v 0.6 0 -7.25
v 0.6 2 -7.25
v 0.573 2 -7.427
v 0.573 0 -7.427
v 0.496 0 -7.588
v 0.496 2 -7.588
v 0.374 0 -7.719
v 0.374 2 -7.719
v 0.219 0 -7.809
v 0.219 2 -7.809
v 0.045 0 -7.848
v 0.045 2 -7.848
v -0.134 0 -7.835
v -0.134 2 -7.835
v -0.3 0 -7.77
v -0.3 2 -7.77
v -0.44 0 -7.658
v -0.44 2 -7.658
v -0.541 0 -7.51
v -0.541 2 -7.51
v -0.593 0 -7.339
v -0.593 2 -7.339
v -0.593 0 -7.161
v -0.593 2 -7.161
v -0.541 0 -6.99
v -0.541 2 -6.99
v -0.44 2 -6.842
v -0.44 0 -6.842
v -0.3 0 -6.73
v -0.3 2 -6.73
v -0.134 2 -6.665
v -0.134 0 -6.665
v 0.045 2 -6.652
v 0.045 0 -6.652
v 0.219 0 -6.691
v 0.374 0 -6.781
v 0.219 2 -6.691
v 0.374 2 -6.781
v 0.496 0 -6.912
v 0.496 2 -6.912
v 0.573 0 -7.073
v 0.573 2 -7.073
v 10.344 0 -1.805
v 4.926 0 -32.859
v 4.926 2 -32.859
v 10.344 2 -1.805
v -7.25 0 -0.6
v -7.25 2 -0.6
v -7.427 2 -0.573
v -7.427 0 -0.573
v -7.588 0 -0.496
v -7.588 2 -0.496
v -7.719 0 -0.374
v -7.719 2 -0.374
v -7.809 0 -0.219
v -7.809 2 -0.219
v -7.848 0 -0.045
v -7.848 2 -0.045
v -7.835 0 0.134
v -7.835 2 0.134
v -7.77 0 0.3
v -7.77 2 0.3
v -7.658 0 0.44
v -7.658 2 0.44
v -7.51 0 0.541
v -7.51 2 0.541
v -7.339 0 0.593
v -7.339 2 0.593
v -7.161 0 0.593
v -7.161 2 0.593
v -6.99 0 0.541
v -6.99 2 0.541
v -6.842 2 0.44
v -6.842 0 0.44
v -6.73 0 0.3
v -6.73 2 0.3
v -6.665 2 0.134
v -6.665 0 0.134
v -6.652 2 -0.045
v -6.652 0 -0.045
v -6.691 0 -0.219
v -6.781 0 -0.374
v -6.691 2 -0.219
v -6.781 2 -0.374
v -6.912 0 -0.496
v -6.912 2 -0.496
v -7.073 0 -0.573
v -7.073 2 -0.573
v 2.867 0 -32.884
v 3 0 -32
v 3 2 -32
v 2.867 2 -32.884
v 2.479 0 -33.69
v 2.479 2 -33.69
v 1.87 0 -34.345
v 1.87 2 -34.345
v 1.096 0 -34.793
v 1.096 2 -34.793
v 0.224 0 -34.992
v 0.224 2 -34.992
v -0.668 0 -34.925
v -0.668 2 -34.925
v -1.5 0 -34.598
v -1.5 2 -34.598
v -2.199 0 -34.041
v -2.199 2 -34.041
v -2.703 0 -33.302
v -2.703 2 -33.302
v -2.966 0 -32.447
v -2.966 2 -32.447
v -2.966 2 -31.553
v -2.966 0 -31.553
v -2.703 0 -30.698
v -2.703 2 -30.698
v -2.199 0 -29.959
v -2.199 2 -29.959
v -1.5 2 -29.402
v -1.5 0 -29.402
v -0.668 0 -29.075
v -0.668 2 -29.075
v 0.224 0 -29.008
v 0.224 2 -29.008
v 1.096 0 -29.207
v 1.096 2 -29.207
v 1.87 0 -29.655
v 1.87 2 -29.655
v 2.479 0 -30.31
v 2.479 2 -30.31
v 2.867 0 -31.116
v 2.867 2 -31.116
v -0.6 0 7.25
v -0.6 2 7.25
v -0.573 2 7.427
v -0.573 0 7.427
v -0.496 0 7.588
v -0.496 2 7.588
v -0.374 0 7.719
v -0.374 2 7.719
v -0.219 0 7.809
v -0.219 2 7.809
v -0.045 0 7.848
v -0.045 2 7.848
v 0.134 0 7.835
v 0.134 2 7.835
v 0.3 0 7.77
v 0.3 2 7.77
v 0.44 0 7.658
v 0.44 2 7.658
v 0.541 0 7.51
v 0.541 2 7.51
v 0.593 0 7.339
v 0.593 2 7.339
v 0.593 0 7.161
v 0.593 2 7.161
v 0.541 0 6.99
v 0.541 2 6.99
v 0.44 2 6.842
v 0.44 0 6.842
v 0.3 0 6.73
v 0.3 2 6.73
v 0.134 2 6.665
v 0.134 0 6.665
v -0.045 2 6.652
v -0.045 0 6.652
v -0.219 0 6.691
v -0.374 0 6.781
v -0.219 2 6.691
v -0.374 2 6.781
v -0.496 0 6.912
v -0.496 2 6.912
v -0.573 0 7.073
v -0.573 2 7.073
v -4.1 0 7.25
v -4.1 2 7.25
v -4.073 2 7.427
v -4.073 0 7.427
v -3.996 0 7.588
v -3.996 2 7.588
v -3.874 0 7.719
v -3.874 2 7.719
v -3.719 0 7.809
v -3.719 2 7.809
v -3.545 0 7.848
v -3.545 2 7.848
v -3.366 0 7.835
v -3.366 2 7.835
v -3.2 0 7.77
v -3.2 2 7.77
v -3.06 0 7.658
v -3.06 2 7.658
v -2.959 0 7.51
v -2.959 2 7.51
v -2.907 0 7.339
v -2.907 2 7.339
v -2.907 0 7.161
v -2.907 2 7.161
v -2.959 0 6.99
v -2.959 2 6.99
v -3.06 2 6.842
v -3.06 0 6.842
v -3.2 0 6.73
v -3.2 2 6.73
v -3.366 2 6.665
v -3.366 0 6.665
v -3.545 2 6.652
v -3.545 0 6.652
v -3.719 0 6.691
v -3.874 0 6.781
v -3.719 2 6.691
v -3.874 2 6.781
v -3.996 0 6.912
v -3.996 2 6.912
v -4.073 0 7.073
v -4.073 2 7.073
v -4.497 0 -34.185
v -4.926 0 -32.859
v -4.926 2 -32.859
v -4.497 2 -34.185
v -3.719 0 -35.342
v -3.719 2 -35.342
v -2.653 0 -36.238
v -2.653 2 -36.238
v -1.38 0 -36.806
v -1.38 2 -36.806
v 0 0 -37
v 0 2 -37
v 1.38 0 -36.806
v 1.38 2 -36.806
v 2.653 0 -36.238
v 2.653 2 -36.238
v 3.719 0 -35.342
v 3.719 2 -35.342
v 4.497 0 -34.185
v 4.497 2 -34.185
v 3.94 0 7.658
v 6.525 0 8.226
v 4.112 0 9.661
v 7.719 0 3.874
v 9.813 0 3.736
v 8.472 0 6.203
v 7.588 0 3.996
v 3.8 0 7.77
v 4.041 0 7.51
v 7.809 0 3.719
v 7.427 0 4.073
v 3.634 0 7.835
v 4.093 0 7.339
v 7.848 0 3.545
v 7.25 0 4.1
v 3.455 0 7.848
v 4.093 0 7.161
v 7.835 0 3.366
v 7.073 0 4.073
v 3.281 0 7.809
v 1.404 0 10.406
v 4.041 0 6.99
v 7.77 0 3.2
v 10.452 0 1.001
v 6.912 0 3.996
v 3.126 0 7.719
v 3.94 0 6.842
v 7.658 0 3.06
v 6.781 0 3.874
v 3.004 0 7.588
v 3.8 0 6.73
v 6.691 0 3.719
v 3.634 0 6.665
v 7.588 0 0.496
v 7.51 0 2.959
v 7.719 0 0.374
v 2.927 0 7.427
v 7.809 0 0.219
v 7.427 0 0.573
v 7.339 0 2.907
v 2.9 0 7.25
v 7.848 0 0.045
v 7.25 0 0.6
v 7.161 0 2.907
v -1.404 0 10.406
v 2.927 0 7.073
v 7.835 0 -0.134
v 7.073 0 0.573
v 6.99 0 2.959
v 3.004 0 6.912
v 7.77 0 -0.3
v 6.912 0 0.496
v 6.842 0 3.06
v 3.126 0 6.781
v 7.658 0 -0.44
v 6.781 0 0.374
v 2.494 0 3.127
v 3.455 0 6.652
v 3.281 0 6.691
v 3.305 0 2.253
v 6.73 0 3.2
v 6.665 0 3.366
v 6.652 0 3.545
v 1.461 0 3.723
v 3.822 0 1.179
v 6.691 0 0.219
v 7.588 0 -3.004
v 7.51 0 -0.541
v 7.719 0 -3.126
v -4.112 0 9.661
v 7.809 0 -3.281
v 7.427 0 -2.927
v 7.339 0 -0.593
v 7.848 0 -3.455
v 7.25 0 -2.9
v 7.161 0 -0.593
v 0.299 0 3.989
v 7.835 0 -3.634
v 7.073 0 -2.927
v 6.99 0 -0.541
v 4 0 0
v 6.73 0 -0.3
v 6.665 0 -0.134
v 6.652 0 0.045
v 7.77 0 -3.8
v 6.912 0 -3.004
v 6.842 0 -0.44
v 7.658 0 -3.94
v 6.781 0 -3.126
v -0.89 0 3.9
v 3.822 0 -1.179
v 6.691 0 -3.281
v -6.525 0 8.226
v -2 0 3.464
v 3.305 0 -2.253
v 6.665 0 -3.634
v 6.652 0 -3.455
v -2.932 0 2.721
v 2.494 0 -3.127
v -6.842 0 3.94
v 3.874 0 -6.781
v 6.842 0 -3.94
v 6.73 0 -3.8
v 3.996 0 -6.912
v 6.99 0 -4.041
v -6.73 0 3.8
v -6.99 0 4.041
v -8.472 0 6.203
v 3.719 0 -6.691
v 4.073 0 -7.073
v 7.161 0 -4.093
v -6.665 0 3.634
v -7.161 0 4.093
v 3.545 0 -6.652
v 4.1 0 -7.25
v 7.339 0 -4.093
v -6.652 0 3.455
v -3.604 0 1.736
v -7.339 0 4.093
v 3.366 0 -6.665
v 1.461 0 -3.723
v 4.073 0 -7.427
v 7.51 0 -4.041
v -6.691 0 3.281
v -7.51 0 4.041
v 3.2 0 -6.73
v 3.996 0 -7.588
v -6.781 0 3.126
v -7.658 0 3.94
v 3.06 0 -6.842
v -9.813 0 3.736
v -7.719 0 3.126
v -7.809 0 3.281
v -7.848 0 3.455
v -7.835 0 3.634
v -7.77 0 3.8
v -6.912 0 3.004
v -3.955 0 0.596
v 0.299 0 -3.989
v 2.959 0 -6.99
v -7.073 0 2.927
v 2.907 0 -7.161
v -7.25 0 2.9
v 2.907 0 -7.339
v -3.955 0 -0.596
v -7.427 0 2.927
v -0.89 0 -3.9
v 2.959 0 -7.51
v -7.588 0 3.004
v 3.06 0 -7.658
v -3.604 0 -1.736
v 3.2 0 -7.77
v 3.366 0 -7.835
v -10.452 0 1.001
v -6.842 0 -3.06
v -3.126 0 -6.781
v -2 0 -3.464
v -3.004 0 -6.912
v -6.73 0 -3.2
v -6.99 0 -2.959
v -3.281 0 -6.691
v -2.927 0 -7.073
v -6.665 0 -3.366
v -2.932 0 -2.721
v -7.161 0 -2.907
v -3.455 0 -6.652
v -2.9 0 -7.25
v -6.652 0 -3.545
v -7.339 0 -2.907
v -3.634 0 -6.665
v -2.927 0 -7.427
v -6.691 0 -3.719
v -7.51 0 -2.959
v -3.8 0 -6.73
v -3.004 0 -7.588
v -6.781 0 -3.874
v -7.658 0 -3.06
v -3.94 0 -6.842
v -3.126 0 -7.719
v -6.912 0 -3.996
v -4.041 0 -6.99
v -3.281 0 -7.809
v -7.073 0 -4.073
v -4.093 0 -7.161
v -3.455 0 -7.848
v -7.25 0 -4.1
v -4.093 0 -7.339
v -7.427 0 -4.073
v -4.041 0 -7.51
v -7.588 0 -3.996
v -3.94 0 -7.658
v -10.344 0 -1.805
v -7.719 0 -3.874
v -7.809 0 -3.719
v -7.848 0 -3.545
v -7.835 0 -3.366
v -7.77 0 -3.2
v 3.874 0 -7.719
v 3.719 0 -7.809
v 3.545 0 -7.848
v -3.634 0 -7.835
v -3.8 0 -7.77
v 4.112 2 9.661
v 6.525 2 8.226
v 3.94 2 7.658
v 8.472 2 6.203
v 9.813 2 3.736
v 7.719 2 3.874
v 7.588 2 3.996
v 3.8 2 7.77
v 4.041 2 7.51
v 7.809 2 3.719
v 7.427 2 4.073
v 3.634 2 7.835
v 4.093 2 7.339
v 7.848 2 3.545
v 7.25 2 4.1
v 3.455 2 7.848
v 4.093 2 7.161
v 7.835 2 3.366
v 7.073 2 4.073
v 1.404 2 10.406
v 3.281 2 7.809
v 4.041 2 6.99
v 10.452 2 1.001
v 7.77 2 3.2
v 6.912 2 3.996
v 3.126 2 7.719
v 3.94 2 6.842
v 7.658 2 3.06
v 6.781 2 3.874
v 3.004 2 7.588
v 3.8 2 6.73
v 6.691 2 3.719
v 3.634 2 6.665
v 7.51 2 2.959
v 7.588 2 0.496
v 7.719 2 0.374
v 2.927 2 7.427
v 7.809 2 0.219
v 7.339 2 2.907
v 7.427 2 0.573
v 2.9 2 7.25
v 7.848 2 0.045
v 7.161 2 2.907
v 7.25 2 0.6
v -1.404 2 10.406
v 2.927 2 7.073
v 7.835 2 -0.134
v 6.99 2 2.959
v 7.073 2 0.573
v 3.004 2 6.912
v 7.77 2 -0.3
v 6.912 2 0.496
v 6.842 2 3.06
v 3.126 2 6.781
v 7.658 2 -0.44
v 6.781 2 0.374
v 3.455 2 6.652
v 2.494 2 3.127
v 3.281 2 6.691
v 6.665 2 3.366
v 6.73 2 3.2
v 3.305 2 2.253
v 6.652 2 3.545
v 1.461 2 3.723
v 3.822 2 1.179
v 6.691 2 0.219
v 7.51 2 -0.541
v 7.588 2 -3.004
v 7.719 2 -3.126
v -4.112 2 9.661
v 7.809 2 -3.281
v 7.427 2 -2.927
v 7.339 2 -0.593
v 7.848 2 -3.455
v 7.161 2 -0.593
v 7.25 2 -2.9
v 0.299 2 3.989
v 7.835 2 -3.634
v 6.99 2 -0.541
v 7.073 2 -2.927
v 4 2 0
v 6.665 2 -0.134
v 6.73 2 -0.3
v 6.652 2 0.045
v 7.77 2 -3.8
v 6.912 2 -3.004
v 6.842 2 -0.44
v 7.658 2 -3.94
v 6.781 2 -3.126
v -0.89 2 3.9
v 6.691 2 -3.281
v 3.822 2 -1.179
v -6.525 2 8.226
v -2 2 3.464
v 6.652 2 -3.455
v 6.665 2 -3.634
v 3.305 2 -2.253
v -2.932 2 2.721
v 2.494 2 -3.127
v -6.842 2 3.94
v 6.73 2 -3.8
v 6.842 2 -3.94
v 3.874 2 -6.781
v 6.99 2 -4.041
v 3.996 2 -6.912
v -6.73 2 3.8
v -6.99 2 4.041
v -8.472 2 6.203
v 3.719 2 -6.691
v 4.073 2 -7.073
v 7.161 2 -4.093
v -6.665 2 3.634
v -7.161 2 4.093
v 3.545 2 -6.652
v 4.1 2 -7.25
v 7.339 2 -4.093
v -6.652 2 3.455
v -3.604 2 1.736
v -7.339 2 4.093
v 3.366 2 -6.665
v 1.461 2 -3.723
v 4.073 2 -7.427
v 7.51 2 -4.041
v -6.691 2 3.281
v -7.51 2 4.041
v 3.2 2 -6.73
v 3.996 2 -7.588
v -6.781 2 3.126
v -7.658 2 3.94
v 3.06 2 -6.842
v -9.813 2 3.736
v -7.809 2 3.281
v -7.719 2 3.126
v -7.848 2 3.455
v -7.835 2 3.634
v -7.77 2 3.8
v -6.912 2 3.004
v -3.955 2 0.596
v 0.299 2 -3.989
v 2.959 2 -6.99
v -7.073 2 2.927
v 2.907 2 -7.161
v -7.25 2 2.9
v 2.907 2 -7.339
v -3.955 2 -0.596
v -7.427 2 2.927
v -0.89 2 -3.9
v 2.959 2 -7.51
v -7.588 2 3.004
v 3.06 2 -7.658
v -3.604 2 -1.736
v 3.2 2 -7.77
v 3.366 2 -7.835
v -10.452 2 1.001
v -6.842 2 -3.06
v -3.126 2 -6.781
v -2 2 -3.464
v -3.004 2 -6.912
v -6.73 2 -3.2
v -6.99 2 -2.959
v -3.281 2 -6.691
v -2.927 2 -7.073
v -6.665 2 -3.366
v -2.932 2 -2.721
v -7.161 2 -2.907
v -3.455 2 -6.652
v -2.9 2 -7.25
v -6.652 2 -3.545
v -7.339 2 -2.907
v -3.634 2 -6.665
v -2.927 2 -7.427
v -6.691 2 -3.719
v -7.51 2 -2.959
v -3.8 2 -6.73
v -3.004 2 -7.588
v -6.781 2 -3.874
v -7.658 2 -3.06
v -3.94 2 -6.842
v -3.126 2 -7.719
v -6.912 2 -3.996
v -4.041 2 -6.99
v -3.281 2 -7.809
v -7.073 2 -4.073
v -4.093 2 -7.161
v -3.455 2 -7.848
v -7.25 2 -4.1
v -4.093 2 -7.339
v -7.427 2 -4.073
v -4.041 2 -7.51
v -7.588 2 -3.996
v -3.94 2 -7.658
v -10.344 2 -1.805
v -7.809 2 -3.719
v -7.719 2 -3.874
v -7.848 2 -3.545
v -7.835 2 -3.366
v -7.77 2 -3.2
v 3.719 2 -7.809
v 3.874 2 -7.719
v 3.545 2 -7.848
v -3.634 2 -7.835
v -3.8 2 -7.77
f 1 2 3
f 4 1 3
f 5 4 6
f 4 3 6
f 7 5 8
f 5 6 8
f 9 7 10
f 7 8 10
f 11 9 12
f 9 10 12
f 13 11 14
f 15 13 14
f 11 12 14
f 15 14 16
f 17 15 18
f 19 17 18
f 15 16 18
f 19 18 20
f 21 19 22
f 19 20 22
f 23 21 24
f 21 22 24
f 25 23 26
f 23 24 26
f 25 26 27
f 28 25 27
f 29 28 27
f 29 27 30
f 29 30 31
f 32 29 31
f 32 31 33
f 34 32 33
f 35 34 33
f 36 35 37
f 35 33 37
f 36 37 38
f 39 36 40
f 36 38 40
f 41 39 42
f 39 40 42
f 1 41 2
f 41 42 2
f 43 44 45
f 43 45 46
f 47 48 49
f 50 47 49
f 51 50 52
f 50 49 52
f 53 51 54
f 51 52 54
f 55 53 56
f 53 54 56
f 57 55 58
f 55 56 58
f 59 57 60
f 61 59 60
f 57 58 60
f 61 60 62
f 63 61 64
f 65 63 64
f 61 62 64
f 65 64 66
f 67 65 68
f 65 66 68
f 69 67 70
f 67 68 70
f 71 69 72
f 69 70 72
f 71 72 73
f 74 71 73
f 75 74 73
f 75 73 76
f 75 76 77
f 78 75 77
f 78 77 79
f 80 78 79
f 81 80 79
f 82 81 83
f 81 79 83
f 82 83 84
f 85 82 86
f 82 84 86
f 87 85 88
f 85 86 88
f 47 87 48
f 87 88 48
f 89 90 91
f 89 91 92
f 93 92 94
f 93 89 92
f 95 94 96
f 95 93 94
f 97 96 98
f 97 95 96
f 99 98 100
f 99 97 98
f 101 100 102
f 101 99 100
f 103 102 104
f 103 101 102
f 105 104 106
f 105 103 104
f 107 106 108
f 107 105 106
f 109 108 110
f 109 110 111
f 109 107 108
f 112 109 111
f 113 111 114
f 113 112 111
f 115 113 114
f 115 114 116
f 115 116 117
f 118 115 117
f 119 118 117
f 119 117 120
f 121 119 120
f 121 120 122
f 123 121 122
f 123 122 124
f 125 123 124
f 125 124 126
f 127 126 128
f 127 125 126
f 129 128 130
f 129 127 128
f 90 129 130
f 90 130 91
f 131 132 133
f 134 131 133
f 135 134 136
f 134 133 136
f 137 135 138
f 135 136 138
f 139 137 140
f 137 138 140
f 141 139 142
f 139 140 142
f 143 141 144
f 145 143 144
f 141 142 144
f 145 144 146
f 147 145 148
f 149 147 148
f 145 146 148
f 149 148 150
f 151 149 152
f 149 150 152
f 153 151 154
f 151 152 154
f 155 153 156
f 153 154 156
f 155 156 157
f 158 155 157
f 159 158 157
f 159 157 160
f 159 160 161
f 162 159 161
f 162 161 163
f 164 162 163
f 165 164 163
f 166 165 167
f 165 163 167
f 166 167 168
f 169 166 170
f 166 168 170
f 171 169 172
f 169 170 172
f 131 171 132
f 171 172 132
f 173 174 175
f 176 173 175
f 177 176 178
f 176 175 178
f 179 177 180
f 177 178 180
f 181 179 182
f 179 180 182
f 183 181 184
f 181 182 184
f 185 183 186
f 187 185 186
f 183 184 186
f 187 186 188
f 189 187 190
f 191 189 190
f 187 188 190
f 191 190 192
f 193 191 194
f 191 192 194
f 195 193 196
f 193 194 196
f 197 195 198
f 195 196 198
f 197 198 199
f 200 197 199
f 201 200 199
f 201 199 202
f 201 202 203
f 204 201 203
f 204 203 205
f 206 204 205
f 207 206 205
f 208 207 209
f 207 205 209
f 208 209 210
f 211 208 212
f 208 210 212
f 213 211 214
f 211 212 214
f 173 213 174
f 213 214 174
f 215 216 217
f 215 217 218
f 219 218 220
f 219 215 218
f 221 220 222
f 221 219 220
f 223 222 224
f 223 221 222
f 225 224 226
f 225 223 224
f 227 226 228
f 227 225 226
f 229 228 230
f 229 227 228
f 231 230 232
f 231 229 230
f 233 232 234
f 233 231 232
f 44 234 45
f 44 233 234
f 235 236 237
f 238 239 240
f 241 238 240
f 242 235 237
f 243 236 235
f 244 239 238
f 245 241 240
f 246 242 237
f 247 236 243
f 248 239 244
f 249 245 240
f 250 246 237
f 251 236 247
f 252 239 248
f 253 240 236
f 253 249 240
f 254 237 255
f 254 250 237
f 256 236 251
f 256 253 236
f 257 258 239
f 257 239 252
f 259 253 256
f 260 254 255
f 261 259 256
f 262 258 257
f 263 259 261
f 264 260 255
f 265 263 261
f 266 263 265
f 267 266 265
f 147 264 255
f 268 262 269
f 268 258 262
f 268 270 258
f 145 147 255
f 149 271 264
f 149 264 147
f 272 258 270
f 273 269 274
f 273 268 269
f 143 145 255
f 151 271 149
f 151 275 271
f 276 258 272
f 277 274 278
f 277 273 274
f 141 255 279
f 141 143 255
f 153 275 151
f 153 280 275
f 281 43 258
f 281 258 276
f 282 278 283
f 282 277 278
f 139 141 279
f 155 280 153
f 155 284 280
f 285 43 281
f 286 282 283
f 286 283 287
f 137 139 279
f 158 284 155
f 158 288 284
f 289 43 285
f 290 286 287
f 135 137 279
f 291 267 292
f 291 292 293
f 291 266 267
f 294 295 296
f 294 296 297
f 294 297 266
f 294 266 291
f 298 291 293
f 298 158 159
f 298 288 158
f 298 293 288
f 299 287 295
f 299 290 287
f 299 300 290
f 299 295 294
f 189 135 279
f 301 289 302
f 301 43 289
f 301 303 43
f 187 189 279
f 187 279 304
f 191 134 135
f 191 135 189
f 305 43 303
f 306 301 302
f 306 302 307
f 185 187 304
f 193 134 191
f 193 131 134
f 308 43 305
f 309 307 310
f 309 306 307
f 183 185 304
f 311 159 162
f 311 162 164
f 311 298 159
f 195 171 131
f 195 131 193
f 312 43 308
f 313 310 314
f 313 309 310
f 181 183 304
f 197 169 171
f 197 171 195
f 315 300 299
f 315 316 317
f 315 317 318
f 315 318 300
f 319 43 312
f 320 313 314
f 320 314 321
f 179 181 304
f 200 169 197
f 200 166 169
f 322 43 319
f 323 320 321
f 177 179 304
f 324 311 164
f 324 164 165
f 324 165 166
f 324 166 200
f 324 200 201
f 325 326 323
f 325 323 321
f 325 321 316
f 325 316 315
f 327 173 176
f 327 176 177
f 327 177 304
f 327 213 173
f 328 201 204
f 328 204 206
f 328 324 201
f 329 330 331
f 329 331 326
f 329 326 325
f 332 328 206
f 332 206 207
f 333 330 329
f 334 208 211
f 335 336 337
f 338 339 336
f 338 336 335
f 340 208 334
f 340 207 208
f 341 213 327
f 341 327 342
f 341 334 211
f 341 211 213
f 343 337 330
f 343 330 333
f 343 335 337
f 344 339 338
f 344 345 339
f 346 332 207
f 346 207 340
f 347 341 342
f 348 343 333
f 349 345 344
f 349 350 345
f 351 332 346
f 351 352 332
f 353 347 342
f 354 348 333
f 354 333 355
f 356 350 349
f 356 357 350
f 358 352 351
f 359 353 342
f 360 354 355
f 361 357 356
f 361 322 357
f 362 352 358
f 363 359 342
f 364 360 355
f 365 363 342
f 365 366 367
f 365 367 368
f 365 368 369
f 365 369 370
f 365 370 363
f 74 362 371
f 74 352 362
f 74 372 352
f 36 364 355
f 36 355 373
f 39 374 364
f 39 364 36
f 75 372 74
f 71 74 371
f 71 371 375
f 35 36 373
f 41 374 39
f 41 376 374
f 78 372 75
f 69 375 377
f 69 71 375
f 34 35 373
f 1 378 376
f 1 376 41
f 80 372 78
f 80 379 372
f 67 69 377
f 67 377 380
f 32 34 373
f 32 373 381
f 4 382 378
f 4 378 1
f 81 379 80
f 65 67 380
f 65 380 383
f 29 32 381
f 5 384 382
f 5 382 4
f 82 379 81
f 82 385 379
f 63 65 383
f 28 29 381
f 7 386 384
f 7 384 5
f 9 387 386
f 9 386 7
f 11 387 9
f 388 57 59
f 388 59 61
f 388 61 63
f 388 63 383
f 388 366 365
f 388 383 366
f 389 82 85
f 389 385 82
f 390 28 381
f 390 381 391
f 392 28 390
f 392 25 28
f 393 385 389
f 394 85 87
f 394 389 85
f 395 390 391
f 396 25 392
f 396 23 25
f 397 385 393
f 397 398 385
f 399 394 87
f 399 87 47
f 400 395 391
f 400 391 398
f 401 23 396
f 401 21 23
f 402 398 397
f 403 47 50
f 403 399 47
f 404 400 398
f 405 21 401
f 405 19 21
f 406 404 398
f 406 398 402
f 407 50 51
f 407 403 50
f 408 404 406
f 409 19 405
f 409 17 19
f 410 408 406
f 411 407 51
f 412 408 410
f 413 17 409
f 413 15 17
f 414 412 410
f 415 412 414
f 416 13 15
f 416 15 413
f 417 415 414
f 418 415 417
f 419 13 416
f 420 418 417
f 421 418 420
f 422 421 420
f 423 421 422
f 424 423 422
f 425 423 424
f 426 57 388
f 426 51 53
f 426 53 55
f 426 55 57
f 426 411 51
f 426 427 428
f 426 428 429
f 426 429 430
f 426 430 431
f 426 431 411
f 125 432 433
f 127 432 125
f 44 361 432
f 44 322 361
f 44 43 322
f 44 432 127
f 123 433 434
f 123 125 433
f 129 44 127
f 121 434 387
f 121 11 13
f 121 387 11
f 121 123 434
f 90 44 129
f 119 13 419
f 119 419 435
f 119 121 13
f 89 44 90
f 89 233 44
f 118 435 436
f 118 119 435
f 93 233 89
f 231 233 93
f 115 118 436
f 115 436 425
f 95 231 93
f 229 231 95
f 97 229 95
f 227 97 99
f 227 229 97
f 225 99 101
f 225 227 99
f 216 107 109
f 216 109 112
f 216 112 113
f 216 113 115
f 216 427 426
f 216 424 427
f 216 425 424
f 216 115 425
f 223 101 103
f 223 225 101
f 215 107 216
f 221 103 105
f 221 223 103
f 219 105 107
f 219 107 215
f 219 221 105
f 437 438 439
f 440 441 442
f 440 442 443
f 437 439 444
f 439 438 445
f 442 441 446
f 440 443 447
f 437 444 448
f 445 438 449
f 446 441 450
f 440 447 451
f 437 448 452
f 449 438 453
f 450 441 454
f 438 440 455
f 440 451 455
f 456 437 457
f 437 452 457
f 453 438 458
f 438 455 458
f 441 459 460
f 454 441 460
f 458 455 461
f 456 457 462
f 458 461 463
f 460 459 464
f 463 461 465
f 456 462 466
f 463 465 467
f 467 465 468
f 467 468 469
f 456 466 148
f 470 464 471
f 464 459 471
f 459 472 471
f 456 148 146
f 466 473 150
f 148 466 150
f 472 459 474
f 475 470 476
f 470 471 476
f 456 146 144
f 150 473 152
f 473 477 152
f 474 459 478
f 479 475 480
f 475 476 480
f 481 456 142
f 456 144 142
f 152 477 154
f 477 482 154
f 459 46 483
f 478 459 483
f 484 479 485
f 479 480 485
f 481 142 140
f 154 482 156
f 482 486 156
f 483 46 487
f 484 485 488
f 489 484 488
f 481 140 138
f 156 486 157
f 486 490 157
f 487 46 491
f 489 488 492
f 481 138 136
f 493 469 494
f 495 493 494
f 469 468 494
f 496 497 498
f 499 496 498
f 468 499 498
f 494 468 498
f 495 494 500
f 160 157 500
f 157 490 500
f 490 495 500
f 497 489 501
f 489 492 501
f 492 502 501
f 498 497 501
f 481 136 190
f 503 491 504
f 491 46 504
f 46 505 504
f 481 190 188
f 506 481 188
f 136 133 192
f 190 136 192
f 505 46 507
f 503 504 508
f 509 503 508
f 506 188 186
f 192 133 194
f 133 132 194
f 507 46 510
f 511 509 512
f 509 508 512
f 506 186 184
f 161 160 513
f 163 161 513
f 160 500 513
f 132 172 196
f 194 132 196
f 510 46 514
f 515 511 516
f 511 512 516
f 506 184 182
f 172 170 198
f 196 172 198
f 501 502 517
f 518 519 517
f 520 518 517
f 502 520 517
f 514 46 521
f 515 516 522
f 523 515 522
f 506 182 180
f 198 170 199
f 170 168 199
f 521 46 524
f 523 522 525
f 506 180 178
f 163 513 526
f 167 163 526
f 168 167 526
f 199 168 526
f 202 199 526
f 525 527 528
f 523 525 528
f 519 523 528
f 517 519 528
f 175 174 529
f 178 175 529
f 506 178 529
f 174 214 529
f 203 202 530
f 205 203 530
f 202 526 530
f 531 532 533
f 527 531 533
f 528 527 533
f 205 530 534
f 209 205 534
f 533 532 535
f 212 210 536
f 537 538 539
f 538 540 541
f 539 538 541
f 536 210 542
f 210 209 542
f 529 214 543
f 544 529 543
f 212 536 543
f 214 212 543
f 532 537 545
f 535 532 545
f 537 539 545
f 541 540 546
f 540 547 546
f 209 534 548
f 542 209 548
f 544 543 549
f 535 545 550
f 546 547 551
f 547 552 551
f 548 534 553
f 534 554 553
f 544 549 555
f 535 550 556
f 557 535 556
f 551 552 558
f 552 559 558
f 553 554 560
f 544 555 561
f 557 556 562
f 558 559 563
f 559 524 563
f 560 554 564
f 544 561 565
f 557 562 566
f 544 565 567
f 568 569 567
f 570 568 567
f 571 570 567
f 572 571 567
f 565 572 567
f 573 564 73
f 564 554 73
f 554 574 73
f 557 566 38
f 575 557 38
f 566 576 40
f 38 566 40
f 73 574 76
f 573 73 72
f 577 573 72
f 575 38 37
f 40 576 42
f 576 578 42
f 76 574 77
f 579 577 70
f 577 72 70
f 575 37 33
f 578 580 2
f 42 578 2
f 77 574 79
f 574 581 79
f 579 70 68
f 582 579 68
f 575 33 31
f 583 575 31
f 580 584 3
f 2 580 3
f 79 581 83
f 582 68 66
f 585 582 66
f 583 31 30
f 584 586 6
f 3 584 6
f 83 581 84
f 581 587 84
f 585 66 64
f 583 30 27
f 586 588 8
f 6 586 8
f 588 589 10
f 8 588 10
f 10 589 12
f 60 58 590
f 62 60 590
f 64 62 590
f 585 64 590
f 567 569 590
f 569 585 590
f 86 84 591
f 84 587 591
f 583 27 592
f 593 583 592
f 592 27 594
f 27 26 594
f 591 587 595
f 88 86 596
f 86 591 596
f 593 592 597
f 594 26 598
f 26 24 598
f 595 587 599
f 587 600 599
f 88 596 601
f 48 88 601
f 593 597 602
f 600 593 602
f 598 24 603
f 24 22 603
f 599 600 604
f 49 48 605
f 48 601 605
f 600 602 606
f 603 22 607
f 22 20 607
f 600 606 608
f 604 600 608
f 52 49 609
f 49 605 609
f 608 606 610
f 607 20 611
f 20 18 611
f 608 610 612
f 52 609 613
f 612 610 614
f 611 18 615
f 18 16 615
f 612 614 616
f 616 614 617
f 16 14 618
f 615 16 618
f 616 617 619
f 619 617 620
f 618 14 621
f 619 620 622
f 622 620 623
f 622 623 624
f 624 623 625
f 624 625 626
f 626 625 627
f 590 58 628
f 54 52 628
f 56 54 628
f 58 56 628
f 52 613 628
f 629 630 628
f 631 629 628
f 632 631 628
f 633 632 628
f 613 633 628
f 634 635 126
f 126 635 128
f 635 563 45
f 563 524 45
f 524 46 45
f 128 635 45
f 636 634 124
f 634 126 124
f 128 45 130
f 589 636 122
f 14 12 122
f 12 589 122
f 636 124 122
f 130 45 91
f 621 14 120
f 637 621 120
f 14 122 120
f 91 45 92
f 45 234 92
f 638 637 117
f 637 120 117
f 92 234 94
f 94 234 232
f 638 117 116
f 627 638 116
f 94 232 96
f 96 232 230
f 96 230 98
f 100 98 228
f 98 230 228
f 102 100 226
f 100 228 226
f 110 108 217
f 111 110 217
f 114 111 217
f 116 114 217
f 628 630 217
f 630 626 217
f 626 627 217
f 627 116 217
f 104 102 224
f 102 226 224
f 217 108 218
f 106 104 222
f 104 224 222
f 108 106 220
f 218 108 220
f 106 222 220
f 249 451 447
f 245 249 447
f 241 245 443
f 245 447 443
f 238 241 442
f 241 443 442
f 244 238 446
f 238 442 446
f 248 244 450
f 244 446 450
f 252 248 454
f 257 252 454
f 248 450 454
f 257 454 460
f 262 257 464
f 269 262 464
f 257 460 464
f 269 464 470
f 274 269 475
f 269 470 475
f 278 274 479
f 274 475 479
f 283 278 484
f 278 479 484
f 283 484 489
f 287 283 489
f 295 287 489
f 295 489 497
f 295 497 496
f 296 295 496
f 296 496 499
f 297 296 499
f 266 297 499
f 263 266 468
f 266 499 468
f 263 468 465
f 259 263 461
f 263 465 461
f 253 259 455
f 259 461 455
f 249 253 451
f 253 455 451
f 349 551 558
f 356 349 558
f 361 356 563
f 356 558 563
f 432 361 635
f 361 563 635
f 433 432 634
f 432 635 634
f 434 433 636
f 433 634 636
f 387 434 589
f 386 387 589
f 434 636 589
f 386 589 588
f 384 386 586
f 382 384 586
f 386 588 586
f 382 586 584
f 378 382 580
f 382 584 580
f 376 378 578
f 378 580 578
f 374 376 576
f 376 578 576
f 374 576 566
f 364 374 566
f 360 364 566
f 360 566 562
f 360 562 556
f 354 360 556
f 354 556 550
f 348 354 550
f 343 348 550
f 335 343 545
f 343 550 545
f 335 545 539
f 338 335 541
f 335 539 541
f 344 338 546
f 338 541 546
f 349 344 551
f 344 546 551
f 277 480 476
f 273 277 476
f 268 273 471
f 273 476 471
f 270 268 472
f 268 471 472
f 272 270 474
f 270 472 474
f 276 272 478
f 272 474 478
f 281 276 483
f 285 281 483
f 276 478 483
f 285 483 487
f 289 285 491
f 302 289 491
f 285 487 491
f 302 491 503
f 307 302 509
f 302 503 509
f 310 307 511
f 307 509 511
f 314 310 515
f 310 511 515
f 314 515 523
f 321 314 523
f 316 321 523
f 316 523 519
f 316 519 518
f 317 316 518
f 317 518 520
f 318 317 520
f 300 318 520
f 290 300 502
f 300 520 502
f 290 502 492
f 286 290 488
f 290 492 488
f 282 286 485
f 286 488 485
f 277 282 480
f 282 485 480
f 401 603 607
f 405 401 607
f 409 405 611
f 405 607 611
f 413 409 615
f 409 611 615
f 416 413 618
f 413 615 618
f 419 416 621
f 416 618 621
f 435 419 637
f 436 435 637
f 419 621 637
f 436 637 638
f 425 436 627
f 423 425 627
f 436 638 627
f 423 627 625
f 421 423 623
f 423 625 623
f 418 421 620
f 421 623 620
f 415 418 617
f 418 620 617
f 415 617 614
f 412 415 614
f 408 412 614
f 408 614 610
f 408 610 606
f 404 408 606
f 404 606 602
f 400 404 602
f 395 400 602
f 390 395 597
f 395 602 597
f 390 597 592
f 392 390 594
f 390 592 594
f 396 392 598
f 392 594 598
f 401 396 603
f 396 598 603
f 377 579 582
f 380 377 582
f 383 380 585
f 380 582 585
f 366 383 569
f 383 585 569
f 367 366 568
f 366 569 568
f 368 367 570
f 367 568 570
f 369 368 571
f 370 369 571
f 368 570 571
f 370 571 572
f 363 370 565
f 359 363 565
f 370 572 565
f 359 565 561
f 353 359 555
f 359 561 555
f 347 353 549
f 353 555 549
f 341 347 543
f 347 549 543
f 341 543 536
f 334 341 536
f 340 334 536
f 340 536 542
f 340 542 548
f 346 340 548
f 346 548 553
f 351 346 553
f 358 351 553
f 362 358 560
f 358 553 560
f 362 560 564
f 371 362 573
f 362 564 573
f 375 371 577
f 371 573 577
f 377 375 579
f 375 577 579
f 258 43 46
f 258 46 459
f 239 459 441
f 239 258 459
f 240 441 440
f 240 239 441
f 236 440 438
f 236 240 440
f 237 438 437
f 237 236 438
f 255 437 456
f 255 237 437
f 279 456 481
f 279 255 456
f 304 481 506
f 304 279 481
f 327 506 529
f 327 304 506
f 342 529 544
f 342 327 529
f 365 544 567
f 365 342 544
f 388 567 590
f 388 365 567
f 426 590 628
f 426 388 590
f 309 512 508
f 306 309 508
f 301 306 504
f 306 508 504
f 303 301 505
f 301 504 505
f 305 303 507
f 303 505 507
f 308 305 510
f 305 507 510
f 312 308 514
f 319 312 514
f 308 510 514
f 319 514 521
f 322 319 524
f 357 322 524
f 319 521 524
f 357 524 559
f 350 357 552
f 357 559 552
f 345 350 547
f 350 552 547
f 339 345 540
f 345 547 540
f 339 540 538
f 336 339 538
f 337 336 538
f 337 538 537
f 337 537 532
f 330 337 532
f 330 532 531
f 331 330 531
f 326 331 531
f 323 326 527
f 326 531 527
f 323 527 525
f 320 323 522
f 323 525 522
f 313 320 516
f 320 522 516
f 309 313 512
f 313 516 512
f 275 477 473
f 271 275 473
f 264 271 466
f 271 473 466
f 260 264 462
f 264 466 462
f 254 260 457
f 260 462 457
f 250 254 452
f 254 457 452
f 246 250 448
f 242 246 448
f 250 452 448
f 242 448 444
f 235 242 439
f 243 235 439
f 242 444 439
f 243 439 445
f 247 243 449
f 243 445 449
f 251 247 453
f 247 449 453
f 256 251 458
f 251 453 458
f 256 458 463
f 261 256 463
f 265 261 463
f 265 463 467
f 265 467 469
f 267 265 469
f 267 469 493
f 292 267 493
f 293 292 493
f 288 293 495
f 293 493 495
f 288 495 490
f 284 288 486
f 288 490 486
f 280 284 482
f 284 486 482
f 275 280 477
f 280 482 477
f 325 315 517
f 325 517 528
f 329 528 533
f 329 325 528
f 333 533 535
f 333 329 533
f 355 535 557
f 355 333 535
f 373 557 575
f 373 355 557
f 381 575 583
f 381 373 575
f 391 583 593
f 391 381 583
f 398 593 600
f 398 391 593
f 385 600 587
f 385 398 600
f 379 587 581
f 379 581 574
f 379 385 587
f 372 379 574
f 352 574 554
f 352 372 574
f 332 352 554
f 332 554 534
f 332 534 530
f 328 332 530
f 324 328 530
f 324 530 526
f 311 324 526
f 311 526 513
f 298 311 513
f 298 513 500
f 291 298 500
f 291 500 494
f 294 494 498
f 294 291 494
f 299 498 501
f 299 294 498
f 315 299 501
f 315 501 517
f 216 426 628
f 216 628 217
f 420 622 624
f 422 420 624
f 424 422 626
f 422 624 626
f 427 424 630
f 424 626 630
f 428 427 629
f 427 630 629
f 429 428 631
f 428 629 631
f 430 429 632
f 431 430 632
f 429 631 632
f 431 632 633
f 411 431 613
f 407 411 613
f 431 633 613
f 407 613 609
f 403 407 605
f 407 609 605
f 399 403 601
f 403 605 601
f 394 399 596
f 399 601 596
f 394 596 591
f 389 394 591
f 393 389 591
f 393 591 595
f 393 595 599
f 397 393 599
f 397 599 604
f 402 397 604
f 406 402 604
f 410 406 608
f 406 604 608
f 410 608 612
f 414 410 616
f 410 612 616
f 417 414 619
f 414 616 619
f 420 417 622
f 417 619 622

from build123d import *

# Parameters (mm, degrees)
CROQUIS1_R              = 4
CROQUIS1_R_2            = 3
SALIENTE_EXTRUIR1_DEPTH = 2
SKETCH1_R               = 0.6
CUT_EXTRUDE1_DEPTH      = 2
CIRPATTERN1_COUNT       = 4


with BuildPart() as part:
    # Croquis1 → Saliente-Extruir1 (new body)
    with BuildSketch(Plane(origin=(0, 0, 0), x_dir=(1, 0, 0), z_dir=(0, 1, 0))):
        with BuildLine():
            Line((4.925593833, 32.859375), (10.34374705, 1.8046875))
            ThreePointArc((10.34374705, 1.8046875), (0, -10.5), (-10.34374705, 1.8046875))
            Line((-10.34374705, 1.8046875), (-4.925593833, 32.859375))
            ThreePointArc((-4.925593833, 32.859375), (0, 37), (4.925593833, 32.859375))
        make_face()
        Circle(CROQUIS1_R, mode=Mode.SUBTRACT)
        with Locations((0, 32)):
            Circle(CROQUIS1_R_2, mode=Mode.SUBTRACT)
    extrude(amount=SALIENTE_EXTRUIR1_DEPTH)

    # Sketch1 → Cut-Extrude1 (cut)
    with BuildSketch(Plane(origin=(0, 2, 0), x_dir=(1, 0, 0), z_dir=(0, 1, 0))):
        with Locations((0, 7.25)):
            Circle(SKETCH1_R)
        with Locations((-3.5, 7.25)):
            Circle(SKETCH1_R)
        with Locations((3.5, 7.25)):
            Circle(SKETCH1_R)
    cut_extrude1 = extrude(amount=-CUT_EXTRUDE1_DEPTH, mode=Mode.SUBTRACT)

    # CirPattern1: Cut-Extrude1 ×4 about axis
    cirpattern1_axis = Axis((0, 0, 0), (0, 1, 0))
    for i in range(1, CIRPATTERN1_COUNT):
        add(cut_extrude1.rotate(cirpattern1_axis, i * 360 / CIRPATTERN1_COUNT), mode=Mode.SUBTRACT)


solid = part.part
